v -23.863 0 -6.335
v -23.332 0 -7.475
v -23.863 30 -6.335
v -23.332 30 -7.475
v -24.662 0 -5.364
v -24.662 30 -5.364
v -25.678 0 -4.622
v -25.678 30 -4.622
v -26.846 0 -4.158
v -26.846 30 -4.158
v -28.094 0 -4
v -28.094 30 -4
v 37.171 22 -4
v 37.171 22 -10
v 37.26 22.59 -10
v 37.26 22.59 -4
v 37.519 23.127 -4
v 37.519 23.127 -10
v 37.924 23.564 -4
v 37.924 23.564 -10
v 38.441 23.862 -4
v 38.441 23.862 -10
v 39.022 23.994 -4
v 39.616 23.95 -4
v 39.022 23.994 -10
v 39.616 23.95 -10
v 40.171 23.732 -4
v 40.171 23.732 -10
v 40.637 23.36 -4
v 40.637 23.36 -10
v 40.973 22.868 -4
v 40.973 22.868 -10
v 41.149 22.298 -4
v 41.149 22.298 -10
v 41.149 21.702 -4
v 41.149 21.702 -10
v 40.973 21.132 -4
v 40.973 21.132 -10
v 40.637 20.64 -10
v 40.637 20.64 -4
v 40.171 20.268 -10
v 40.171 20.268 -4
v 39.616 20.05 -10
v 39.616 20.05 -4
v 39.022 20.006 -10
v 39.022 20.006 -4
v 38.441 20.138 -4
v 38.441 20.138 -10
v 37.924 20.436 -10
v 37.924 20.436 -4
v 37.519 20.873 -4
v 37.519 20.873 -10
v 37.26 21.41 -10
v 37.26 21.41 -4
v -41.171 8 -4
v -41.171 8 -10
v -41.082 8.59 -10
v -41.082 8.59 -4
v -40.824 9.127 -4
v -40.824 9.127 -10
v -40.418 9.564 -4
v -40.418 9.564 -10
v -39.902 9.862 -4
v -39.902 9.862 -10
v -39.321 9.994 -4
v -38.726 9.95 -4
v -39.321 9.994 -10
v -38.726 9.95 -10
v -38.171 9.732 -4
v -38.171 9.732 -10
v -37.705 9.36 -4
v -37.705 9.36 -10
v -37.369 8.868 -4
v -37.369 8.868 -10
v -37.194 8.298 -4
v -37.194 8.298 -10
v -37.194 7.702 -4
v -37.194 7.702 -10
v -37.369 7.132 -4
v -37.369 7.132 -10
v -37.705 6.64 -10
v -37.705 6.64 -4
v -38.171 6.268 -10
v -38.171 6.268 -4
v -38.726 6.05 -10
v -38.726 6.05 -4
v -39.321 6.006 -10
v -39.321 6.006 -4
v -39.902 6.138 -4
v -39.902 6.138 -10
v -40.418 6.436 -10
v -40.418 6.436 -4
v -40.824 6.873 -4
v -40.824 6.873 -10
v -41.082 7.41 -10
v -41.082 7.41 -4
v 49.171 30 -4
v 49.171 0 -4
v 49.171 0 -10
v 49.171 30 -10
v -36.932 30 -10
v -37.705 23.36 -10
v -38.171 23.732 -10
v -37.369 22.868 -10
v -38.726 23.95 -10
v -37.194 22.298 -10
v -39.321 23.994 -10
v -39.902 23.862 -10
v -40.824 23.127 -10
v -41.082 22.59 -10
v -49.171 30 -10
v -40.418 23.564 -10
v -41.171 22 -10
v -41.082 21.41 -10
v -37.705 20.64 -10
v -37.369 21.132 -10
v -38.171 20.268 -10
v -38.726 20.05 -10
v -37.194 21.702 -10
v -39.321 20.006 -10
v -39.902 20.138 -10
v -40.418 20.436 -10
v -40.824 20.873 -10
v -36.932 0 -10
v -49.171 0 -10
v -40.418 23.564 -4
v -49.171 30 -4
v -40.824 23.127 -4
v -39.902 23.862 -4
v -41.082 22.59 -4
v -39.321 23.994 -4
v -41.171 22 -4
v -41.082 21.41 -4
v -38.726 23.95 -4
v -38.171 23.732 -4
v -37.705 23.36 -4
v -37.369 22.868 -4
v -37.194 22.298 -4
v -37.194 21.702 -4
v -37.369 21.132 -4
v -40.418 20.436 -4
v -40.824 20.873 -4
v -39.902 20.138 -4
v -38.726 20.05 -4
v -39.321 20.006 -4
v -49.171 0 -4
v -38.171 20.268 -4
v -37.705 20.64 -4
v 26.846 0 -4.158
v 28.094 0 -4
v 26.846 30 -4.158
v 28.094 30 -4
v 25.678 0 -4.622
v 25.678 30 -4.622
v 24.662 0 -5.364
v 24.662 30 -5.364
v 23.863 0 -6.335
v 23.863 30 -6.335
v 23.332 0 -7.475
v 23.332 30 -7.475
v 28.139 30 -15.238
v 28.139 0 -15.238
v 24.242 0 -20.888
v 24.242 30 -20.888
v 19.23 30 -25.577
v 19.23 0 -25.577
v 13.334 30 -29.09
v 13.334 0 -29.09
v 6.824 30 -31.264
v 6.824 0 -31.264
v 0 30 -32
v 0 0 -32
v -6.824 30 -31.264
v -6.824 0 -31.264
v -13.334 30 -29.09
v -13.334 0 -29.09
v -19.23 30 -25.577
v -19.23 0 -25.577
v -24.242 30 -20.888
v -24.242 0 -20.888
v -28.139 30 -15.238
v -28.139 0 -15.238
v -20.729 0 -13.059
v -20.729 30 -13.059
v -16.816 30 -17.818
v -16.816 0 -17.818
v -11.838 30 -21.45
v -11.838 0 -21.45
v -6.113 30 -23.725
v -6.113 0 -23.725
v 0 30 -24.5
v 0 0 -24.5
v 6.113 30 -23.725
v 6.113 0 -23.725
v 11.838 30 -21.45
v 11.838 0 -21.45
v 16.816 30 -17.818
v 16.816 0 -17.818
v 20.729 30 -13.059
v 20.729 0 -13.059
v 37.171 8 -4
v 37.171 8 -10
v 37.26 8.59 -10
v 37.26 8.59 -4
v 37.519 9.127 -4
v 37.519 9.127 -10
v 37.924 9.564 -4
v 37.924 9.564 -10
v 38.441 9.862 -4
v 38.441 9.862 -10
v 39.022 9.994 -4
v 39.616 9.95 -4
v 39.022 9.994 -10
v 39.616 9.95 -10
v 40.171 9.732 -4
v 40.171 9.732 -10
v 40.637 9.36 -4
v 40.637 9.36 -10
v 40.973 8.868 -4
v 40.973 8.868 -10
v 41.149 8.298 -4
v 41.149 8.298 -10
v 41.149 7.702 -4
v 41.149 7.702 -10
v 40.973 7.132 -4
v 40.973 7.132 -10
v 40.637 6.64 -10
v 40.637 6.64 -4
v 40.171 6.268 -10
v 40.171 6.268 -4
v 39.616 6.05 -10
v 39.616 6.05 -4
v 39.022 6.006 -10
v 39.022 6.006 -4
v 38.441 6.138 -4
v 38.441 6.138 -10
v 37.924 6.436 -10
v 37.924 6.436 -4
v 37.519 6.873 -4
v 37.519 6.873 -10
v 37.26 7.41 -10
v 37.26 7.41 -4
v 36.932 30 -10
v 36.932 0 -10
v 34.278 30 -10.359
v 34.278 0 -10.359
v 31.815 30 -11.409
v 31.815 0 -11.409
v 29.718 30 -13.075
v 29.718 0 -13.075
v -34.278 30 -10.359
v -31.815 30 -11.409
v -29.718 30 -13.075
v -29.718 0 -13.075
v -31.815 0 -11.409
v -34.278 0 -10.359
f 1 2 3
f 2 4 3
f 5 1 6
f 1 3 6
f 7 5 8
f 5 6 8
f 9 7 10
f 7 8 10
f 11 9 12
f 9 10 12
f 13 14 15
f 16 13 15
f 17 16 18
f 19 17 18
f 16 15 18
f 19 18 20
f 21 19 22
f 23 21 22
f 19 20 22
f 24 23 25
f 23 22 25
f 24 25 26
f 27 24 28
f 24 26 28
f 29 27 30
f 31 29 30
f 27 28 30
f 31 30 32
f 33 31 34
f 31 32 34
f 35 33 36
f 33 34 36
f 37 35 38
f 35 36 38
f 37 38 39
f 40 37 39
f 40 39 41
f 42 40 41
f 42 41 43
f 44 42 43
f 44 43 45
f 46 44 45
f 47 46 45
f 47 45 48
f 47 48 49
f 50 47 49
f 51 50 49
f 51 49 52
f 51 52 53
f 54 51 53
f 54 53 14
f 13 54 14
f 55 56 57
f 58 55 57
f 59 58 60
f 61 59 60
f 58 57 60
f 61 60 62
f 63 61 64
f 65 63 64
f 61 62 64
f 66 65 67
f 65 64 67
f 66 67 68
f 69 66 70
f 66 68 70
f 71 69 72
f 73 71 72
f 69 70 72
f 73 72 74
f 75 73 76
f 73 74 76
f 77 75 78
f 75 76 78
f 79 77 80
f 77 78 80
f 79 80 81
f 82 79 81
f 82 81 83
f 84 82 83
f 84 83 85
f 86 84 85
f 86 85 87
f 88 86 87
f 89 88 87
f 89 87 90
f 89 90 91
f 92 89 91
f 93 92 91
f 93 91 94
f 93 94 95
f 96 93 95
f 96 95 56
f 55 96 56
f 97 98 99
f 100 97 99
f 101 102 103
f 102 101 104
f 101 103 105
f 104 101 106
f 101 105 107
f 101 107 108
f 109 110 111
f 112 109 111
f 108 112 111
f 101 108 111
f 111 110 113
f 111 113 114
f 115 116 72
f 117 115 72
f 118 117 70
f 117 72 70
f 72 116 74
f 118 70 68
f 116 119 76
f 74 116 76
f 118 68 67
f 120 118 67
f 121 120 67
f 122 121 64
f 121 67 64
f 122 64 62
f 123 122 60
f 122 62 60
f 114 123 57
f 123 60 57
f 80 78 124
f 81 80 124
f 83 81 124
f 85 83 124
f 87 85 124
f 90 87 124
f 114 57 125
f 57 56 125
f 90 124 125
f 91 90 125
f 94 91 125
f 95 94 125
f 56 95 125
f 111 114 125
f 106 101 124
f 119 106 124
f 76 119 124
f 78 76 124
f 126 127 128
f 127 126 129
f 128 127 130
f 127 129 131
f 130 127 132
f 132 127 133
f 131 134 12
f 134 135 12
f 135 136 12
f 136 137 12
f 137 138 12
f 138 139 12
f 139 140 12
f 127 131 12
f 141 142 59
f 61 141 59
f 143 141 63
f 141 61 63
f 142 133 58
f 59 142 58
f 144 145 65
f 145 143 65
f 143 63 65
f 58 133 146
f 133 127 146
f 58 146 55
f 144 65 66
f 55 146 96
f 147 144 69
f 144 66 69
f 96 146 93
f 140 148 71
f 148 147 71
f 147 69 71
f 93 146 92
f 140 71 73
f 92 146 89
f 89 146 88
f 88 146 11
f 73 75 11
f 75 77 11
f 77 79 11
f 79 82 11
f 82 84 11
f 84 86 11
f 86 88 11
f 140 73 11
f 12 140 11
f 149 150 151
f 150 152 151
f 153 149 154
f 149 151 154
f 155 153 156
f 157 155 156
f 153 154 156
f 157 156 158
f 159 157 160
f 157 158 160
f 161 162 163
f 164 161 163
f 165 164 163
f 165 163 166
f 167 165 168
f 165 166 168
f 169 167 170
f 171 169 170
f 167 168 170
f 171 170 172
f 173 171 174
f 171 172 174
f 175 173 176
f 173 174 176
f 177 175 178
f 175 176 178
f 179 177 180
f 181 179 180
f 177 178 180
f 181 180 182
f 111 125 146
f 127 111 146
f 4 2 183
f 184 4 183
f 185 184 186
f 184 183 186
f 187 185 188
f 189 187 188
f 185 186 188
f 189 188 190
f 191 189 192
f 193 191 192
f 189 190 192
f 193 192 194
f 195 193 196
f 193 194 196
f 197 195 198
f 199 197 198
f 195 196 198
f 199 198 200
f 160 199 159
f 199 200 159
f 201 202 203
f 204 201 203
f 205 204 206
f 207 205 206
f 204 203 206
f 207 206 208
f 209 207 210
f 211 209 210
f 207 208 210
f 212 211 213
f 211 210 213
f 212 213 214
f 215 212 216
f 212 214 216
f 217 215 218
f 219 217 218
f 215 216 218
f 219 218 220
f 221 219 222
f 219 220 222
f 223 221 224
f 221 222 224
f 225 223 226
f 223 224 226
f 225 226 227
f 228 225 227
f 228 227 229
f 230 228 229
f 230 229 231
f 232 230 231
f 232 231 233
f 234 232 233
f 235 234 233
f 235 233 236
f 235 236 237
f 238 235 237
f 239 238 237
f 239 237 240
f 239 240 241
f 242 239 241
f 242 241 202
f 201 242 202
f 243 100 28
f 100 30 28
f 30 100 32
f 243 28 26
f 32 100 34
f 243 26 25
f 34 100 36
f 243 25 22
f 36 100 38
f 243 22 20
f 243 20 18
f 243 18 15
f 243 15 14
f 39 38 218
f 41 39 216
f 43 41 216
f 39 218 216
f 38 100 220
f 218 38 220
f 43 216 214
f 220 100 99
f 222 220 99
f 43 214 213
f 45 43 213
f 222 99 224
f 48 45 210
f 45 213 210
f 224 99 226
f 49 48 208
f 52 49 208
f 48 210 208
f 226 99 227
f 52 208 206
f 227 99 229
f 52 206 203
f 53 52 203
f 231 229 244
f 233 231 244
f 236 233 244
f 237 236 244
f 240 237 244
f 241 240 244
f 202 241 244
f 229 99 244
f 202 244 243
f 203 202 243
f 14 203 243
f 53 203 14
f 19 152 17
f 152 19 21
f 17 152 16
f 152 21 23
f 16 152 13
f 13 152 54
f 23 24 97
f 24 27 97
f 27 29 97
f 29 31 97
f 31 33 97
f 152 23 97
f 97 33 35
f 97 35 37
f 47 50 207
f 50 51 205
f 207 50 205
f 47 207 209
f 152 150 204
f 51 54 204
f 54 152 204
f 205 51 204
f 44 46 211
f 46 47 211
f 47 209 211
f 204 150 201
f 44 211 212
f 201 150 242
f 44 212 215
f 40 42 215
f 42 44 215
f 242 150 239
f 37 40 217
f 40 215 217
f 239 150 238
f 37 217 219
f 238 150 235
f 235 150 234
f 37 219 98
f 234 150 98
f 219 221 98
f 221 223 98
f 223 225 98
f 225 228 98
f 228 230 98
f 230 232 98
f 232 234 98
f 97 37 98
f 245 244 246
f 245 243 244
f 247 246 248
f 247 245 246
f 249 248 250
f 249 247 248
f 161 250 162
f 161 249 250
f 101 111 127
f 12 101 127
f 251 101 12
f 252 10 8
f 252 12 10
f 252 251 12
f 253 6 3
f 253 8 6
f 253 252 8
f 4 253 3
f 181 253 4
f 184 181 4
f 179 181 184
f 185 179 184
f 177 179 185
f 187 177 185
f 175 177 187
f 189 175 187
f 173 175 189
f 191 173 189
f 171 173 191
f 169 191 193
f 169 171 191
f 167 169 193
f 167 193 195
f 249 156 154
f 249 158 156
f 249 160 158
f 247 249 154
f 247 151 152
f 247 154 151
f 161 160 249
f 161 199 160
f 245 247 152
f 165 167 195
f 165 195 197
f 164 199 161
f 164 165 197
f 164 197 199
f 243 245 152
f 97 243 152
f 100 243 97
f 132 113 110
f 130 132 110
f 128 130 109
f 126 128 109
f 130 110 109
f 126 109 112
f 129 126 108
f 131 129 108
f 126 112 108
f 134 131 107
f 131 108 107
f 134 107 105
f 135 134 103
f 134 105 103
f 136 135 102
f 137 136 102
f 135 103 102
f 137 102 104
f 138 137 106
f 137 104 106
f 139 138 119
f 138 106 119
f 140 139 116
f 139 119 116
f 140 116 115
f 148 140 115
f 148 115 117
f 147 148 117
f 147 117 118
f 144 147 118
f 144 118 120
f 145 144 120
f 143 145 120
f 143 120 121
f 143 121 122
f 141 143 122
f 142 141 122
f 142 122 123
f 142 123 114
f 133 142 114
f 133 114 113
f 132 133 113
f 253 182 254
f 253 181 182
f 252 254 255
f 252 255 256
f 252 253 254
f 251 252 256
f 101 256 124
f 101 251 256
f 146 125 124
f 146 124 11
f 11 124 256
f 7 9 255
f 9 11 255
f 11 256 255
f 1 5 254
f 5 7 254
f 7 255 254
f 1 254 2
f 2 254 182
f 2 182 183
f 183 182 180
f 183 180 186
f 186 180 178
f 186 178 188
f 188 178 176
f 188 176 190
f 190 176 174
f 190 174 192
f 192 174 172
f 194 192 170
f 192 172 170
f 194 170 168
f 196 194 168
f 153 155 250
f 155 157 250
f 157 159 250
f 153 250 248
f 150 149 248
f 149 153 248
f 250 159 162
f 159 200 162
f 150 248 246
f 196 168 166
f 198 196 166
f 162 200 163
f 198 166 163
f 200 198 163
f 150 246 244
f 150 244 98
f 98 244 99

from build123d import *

# Parameters (mm, degrees)
BOSS_EXTRUDE1_DEPTH = 30
SKETCH2_R           = 2
CUT_EXTRUDE1_DEPTH  = 7
FILLET1_R           = 10
FILLET2_R           = 5


with BuildPart() as part:
    # Sketch1 → Boss-Extrude1 (new body)
    with BuildSketch(Plane(origin=(0, 0, 0), x_dir=(1, 0, 0), z_dir=(0, 1, 0))):
        with BuildLine():
            ThreePointArc((-24.171263931, 4), (0, 24.5), (24.171263931, 4))
            Line((24.171263931, 4), (49.171263931, 4))
            Line((49.171263931, 4), (49.171263931, 10))
            Line((49.171263931, 10), (30.397368307, 10))
            ThreePointArc((30.397368307, 10), (0, 32), (-30.397368307, 10))
            Line((-30.397368307, 10), (-49.171263931, 10))
            Line((-49.171263931, 10), (-49.171263931, 4))
            Line((-49.171263931, 4), (-24.171263931, 4))
        make_face()
    extrude(amount=BOSS_EXTRUDE1_DEPTH)

    # Sketch2 → Cut-Extrude1 (cut, through all)
    with BuildSketch(Plane(origin=(0, 0, -10), x_dir=(-1, 0, 0), z_dir=(0, 0, -1))):
        with Locations((-39.171263931, 22)):
            Circle(SKETCH2_R)
        with Locations((-39.171263931, 8)):
            Circle(SKETCH2_R)
        with Locations((39.171263931, 8)):
            Circle(SKETCH2_R)
        with Locations((39.171263931, 22)):
            Circle(SKETCH2_R)
    extrude(amount=-CUT_EXTRUDE1_DEPTH, mode=Mode.SUBTRACT)

    # Fillet1
    fillet1_edges = [part.edges().sort_by_distance(p)[0] for p in [
        (-30.397368307, 15, -10),
        (30.397368307, 15, -10),
    ]]
    fillet(fillet1_edges, radius=FILLET1_R)

    # Fillet2
    fillet2_edges = [part.edges().sort_by_distance(p)[0] for p in [
        (-24.171263931, 15, -4),
        (24.171263931, 15, -4),
    ]]
    fillet(fillet2_edges, radius=FILLET2_R)


solid = part.part
